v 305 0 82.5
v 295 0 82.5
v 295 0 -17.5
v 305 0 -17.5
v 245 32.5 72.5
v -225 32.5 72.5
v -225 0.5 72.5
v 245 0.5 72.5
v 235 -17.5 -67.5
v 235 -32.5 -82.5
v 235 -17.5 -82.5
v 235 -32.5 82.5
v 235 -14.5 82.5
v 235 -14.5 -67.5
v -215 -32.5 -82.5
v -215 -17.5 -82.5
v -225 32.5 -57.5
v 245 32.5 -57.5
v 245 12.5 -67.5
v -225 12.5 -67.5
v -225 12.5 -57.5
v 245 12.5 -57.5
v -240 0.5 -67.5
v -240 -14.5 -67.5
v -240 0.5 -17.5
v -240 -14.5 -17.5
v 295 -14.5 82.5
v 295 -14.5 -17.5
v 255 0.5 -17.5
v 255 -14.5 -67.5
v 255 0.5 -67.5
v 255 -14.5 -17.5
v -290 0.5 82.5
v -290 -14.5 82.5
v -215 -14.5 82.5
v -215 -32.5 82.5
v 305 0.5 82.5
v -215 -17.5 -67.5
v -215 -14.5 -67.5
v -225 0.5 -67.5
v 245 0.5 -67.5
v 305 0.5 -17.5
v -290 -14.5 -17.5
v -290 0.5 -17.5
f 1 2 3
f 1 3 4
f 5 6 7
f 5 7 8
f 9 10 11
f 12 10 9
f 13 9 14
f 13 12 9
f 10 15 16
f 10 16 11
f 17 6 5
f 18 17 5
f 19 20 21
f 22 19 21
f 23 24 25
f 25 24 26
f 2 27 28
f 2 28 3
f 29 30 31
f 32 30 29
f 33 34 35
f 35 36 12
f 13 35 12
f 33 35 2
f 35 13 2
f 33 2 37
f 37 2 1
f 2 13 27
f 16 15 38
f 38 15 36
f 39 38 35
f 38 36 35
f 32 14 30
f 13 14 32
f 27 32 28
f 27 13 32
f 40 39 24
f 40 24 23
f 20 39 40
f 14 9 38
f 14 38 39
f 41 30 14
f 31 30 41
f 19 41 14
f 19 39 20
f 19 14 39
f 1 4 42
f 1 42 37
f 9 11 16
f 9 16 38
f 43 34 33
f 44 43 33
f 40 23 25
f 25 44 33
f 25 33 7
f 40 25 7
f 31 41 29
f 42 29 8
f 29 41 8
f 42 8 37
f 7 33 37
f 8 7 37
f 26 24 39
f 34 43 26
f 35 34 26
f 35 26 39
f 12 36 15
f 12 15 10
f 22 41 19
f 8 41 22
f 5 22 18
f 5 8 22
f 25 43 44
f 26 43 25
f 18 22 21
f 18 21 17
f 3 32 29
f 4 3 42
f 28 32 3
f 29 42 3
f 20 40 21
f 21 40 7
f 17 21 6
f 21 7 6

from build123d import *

# Parameters (mm, degrees)
SKETCH053_W     = 610
SKETCH053_H     = 165
PAD005_DEPTH    = 65
SKETCH054_W     = 60
SKETCH054_H     = 32
SKETCH054_W_2   = 70
SKETCH054_H_2   = 18
POCKET047_DEPTH = 165.001
SKETCH055_W     = 80
SKETCH055_H     = 32
SKETCH055_W_2   = 90
SKETCH055_H_2   = 18
POCKET048_DEPTH = 165.001
SKETCH056_W     = 50
SKETCH056_H     = 65
POCKET049_DEPTH = 65.001
SKETCH057_W     = 65
SKETCH057_H     = 65
POCKET050_DEPTH = 65.001
SKETCH059_W     = 610
SKETCH059_H     = 32
POCKET052_DEPTH = 10
SKETCH060_W     = 20
SKETCH060_H     = 25
POCKET053_DEPTH = 610.001
SKETCH061_W     = 50
SKETCH061_H     = 15
POCKET054_DEPTH = 610.001
SKETCH062_W     = 15
SKETCH062_H     = 65
POCKET055_DEPTH = 165.001
SKETCH063_W     = 10
SKETCH063_H     = 32.5
POCKET056_DEPTH = 165.001


with BuildPart() as part:
    # Sketch053 (on DatumPlane) → Pad005 (new body)
    with BuildSketch(Plane.XZ.offset(32.5)):
        Rectangle(SKETCH053_W, SKETCH053_H)
    extrude(amount=-PAD005_DEPTH)

    # Sketch054 (on DatumPlane) → Pocket047 (cut, through all)
    with BuildSketch(Plane.XY.offset(82.5)):
        with Locations((275, 16.5)):
            Rectangle(SKETCH054_W, SKETCH054_H)
        with Locations((270, -23.5)):
            Rectangle(SKETCH054_W_2, SKETCH054_H_2)
    extrude(amount=-POCKET047_DEPTH, mode=Mode.SUBTRACT)

    # Sketch055 (on DatumPlane) → Pocket048 (cut, through all)
    with BuildSketch(Plane.XY.offset(82.5)):
        with Locations((-265, 16.5)):
            Rectangle(SKETCH055_W, SKETCH055_H)
        with Locations((-260, -23.5)):
            Rectangle(SKETCH055_W_2, SKETCH055_H_2)
    extrude(amount=-POCKET048_DEPTH, mode=Mode.SUBTRACT)

    # Sketch056 (on DatumPlane) → Pocket049 (cut, through all)
    with BuildSketch(Plane.XZ.offset(32.5)):
        with Locations((280, -50)):
            Rectangle(SKETCH056_W, SKETCH056_H)
    extrude(amount=-POCKET049_DEPTH, mode=Mode.SUBTRACT)

    # Sketch057 (on DatumPlane) → Pocket050 (cut, through all)
    with BuildSketch(Plane.XZ.offset(32.5)):
        with Locations((-272.5, -50)):
            Rectangle(SKETCH057_W, SKETCH057_H)
    extrude(amount=-POCKET050_DEPTH, mode=Mode.SUBTRACT)

    # Sketch059 (on DatumPlane) → Pocket052 (cut)
    with BuildSketch(Plane.XY.offset(82.5)):
        with Locations((0, 16.5)):
            Rectangle(SKETCH059_W, SKETCH059_H)
    extrude(amount=-POCKET052_DEPTH, mode=Mode.SUBTRACT)

    # Sketch060 (on DatumPlane) → Pocket053 (cut, through all)
    with BuildSketch(Plane.YZ.offset(305)):
        with Locations((22.5, -70)):
            Rectangle(SKETCH060_W, SKETCH060_H)
    extrude(amount=-POCKET053_DEPTH, mode=Mode.SUBTRACT)

    # Sketch061 (on DatumPlane) → Pocket054 (cut, through all)
    with BuildSketch(Plane.YZ.offset(305)):
        with Locations((7.5, -75)):
            Rectangle(SKETCH061_W, SKETCH061_H)
    extrude(amount=-POCKET054_DEPTH, mode=Mode.SUBTRACT)

    # Sketch062 (on DatumPlane) → Pocket055 (cut, through all)
    with BuildSketch(Plane.XY.offset(82.5)):
        with Locations((-297.5, 0)):
            Rectangle(SKETCH062_W, SKETCH062_H)
    extrude(amount=-POCKET055_DEPTH, mode=Mode.SUBTRACT)

    # Sketch063 (on DatumPlane) → Pocket056 (cut, through all)
    with BuildSketch(Plane.XY.offset(82.5)):
        with Locations((300, -16.25)):
            Rectangle(SKETCH063_W, SKETCH063_H)
    extrude(amount=-POCKET056_DEPTH, mode=Mode.SUBTRACT)


solid = part.part
